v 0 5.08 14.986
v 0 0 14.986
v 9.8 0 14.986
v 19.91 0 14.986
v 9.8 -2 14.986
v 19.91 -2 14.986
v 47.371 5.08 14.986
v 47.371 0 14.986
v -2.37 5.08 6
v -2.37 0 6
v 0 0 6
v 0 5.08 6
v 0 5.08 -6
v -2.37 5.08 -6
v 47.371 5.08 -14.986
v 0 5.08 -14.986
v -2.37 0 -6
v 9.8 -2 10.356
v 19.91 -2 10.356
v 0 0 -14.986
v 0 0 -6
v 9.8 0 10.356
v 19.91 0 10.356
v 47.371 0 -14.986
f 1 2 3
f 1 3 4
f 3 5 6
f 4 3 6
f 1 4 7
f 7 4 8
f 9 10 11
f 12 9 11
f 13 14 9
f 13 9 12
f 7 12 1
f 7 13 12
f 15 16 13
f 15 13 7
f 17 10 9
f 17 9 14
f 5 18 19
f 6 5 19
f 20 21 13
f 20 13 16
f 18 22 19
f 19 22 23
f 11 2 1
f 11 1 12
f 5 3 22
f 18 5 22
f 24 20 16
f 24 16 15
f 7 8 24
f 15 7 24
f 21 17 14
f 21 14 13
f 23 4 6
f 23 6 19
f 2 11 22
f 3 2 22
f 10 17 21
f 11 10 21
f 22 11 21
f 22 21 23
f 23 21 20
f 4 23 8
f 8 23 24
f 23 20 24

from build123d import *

# Parameters (mm, degrees)
SKETCH1_W               = 47.371
SKETCH1_H               = 29.972
SKETCH1_W_2             = 18.415
SKETCH1_H_2             = 12
BOSS_EXTRUDE1_DEPTH     = 5.08
SKETCH2_W               = 10.11
SKETCH2_H               = 4.63
BOSS_EXTRUDE2_DEPTH     = 2
SKETCH3_W               = 16.045
SKETCH3_H               = 12
CUT_EXTRUDE1_DEPTH      = 6.08
CUT_EXTRUDE1_DEPTH_BACK = 3


with BuildPart() as part:
    # Sketch1 → Boss-Extrude1 (new body)
    with BuildSketch(Plane(origin=(0, 0, 0), x_dir=(1, 0, 0), z_dir=(0, 1, 0))):
        with Locations((23.6855, 0)):
            Rectangle(SKETCH1_W, SKETCH1_H)
        with Locations((-9.2075, 0)):
            Rectangle(SKETCH1_W_2, SKETCH1_H_2)
    extrude(amount=BOSS_EXTRUDE1_DEPTH)

    # Sketch2 → Boss-Extrude2 (add)
    with BuildSketch(Plane(origin=(0, 0, 0), x_dir=(1, 0, 0), z_dir=(0, 1, 0))):
        with Locations((14.855, -12.671)):
            Rectangle(SKETCH2_W, SKETCH2_H)
    extrude(amount=-BOSS_EXTRUDE2_DEPTH)

    # Sketch3 → Cut-Extrude1 (cut, two sides)
    with BuildSketch(Plane(origin=(0, 0, 0), x_dir=(1, 0, 0), z_dir=(0, 1, 0))) as cut_extrude1_sk:
        with Locations((-10.3925, 0)):
            Rectangle(SKETCH3_W, SKETCH3_H)
    extrude(amount=CUT_EXTRUDE1_DEPTH, mode=Mode.SUBTRACT)
    extrude(cut_extrude1_sk.sketch, amount=-CUT_EXTRUDE1_DEPTH_BACK, mode=Mode.SUBTRACT)


solid = part.part
